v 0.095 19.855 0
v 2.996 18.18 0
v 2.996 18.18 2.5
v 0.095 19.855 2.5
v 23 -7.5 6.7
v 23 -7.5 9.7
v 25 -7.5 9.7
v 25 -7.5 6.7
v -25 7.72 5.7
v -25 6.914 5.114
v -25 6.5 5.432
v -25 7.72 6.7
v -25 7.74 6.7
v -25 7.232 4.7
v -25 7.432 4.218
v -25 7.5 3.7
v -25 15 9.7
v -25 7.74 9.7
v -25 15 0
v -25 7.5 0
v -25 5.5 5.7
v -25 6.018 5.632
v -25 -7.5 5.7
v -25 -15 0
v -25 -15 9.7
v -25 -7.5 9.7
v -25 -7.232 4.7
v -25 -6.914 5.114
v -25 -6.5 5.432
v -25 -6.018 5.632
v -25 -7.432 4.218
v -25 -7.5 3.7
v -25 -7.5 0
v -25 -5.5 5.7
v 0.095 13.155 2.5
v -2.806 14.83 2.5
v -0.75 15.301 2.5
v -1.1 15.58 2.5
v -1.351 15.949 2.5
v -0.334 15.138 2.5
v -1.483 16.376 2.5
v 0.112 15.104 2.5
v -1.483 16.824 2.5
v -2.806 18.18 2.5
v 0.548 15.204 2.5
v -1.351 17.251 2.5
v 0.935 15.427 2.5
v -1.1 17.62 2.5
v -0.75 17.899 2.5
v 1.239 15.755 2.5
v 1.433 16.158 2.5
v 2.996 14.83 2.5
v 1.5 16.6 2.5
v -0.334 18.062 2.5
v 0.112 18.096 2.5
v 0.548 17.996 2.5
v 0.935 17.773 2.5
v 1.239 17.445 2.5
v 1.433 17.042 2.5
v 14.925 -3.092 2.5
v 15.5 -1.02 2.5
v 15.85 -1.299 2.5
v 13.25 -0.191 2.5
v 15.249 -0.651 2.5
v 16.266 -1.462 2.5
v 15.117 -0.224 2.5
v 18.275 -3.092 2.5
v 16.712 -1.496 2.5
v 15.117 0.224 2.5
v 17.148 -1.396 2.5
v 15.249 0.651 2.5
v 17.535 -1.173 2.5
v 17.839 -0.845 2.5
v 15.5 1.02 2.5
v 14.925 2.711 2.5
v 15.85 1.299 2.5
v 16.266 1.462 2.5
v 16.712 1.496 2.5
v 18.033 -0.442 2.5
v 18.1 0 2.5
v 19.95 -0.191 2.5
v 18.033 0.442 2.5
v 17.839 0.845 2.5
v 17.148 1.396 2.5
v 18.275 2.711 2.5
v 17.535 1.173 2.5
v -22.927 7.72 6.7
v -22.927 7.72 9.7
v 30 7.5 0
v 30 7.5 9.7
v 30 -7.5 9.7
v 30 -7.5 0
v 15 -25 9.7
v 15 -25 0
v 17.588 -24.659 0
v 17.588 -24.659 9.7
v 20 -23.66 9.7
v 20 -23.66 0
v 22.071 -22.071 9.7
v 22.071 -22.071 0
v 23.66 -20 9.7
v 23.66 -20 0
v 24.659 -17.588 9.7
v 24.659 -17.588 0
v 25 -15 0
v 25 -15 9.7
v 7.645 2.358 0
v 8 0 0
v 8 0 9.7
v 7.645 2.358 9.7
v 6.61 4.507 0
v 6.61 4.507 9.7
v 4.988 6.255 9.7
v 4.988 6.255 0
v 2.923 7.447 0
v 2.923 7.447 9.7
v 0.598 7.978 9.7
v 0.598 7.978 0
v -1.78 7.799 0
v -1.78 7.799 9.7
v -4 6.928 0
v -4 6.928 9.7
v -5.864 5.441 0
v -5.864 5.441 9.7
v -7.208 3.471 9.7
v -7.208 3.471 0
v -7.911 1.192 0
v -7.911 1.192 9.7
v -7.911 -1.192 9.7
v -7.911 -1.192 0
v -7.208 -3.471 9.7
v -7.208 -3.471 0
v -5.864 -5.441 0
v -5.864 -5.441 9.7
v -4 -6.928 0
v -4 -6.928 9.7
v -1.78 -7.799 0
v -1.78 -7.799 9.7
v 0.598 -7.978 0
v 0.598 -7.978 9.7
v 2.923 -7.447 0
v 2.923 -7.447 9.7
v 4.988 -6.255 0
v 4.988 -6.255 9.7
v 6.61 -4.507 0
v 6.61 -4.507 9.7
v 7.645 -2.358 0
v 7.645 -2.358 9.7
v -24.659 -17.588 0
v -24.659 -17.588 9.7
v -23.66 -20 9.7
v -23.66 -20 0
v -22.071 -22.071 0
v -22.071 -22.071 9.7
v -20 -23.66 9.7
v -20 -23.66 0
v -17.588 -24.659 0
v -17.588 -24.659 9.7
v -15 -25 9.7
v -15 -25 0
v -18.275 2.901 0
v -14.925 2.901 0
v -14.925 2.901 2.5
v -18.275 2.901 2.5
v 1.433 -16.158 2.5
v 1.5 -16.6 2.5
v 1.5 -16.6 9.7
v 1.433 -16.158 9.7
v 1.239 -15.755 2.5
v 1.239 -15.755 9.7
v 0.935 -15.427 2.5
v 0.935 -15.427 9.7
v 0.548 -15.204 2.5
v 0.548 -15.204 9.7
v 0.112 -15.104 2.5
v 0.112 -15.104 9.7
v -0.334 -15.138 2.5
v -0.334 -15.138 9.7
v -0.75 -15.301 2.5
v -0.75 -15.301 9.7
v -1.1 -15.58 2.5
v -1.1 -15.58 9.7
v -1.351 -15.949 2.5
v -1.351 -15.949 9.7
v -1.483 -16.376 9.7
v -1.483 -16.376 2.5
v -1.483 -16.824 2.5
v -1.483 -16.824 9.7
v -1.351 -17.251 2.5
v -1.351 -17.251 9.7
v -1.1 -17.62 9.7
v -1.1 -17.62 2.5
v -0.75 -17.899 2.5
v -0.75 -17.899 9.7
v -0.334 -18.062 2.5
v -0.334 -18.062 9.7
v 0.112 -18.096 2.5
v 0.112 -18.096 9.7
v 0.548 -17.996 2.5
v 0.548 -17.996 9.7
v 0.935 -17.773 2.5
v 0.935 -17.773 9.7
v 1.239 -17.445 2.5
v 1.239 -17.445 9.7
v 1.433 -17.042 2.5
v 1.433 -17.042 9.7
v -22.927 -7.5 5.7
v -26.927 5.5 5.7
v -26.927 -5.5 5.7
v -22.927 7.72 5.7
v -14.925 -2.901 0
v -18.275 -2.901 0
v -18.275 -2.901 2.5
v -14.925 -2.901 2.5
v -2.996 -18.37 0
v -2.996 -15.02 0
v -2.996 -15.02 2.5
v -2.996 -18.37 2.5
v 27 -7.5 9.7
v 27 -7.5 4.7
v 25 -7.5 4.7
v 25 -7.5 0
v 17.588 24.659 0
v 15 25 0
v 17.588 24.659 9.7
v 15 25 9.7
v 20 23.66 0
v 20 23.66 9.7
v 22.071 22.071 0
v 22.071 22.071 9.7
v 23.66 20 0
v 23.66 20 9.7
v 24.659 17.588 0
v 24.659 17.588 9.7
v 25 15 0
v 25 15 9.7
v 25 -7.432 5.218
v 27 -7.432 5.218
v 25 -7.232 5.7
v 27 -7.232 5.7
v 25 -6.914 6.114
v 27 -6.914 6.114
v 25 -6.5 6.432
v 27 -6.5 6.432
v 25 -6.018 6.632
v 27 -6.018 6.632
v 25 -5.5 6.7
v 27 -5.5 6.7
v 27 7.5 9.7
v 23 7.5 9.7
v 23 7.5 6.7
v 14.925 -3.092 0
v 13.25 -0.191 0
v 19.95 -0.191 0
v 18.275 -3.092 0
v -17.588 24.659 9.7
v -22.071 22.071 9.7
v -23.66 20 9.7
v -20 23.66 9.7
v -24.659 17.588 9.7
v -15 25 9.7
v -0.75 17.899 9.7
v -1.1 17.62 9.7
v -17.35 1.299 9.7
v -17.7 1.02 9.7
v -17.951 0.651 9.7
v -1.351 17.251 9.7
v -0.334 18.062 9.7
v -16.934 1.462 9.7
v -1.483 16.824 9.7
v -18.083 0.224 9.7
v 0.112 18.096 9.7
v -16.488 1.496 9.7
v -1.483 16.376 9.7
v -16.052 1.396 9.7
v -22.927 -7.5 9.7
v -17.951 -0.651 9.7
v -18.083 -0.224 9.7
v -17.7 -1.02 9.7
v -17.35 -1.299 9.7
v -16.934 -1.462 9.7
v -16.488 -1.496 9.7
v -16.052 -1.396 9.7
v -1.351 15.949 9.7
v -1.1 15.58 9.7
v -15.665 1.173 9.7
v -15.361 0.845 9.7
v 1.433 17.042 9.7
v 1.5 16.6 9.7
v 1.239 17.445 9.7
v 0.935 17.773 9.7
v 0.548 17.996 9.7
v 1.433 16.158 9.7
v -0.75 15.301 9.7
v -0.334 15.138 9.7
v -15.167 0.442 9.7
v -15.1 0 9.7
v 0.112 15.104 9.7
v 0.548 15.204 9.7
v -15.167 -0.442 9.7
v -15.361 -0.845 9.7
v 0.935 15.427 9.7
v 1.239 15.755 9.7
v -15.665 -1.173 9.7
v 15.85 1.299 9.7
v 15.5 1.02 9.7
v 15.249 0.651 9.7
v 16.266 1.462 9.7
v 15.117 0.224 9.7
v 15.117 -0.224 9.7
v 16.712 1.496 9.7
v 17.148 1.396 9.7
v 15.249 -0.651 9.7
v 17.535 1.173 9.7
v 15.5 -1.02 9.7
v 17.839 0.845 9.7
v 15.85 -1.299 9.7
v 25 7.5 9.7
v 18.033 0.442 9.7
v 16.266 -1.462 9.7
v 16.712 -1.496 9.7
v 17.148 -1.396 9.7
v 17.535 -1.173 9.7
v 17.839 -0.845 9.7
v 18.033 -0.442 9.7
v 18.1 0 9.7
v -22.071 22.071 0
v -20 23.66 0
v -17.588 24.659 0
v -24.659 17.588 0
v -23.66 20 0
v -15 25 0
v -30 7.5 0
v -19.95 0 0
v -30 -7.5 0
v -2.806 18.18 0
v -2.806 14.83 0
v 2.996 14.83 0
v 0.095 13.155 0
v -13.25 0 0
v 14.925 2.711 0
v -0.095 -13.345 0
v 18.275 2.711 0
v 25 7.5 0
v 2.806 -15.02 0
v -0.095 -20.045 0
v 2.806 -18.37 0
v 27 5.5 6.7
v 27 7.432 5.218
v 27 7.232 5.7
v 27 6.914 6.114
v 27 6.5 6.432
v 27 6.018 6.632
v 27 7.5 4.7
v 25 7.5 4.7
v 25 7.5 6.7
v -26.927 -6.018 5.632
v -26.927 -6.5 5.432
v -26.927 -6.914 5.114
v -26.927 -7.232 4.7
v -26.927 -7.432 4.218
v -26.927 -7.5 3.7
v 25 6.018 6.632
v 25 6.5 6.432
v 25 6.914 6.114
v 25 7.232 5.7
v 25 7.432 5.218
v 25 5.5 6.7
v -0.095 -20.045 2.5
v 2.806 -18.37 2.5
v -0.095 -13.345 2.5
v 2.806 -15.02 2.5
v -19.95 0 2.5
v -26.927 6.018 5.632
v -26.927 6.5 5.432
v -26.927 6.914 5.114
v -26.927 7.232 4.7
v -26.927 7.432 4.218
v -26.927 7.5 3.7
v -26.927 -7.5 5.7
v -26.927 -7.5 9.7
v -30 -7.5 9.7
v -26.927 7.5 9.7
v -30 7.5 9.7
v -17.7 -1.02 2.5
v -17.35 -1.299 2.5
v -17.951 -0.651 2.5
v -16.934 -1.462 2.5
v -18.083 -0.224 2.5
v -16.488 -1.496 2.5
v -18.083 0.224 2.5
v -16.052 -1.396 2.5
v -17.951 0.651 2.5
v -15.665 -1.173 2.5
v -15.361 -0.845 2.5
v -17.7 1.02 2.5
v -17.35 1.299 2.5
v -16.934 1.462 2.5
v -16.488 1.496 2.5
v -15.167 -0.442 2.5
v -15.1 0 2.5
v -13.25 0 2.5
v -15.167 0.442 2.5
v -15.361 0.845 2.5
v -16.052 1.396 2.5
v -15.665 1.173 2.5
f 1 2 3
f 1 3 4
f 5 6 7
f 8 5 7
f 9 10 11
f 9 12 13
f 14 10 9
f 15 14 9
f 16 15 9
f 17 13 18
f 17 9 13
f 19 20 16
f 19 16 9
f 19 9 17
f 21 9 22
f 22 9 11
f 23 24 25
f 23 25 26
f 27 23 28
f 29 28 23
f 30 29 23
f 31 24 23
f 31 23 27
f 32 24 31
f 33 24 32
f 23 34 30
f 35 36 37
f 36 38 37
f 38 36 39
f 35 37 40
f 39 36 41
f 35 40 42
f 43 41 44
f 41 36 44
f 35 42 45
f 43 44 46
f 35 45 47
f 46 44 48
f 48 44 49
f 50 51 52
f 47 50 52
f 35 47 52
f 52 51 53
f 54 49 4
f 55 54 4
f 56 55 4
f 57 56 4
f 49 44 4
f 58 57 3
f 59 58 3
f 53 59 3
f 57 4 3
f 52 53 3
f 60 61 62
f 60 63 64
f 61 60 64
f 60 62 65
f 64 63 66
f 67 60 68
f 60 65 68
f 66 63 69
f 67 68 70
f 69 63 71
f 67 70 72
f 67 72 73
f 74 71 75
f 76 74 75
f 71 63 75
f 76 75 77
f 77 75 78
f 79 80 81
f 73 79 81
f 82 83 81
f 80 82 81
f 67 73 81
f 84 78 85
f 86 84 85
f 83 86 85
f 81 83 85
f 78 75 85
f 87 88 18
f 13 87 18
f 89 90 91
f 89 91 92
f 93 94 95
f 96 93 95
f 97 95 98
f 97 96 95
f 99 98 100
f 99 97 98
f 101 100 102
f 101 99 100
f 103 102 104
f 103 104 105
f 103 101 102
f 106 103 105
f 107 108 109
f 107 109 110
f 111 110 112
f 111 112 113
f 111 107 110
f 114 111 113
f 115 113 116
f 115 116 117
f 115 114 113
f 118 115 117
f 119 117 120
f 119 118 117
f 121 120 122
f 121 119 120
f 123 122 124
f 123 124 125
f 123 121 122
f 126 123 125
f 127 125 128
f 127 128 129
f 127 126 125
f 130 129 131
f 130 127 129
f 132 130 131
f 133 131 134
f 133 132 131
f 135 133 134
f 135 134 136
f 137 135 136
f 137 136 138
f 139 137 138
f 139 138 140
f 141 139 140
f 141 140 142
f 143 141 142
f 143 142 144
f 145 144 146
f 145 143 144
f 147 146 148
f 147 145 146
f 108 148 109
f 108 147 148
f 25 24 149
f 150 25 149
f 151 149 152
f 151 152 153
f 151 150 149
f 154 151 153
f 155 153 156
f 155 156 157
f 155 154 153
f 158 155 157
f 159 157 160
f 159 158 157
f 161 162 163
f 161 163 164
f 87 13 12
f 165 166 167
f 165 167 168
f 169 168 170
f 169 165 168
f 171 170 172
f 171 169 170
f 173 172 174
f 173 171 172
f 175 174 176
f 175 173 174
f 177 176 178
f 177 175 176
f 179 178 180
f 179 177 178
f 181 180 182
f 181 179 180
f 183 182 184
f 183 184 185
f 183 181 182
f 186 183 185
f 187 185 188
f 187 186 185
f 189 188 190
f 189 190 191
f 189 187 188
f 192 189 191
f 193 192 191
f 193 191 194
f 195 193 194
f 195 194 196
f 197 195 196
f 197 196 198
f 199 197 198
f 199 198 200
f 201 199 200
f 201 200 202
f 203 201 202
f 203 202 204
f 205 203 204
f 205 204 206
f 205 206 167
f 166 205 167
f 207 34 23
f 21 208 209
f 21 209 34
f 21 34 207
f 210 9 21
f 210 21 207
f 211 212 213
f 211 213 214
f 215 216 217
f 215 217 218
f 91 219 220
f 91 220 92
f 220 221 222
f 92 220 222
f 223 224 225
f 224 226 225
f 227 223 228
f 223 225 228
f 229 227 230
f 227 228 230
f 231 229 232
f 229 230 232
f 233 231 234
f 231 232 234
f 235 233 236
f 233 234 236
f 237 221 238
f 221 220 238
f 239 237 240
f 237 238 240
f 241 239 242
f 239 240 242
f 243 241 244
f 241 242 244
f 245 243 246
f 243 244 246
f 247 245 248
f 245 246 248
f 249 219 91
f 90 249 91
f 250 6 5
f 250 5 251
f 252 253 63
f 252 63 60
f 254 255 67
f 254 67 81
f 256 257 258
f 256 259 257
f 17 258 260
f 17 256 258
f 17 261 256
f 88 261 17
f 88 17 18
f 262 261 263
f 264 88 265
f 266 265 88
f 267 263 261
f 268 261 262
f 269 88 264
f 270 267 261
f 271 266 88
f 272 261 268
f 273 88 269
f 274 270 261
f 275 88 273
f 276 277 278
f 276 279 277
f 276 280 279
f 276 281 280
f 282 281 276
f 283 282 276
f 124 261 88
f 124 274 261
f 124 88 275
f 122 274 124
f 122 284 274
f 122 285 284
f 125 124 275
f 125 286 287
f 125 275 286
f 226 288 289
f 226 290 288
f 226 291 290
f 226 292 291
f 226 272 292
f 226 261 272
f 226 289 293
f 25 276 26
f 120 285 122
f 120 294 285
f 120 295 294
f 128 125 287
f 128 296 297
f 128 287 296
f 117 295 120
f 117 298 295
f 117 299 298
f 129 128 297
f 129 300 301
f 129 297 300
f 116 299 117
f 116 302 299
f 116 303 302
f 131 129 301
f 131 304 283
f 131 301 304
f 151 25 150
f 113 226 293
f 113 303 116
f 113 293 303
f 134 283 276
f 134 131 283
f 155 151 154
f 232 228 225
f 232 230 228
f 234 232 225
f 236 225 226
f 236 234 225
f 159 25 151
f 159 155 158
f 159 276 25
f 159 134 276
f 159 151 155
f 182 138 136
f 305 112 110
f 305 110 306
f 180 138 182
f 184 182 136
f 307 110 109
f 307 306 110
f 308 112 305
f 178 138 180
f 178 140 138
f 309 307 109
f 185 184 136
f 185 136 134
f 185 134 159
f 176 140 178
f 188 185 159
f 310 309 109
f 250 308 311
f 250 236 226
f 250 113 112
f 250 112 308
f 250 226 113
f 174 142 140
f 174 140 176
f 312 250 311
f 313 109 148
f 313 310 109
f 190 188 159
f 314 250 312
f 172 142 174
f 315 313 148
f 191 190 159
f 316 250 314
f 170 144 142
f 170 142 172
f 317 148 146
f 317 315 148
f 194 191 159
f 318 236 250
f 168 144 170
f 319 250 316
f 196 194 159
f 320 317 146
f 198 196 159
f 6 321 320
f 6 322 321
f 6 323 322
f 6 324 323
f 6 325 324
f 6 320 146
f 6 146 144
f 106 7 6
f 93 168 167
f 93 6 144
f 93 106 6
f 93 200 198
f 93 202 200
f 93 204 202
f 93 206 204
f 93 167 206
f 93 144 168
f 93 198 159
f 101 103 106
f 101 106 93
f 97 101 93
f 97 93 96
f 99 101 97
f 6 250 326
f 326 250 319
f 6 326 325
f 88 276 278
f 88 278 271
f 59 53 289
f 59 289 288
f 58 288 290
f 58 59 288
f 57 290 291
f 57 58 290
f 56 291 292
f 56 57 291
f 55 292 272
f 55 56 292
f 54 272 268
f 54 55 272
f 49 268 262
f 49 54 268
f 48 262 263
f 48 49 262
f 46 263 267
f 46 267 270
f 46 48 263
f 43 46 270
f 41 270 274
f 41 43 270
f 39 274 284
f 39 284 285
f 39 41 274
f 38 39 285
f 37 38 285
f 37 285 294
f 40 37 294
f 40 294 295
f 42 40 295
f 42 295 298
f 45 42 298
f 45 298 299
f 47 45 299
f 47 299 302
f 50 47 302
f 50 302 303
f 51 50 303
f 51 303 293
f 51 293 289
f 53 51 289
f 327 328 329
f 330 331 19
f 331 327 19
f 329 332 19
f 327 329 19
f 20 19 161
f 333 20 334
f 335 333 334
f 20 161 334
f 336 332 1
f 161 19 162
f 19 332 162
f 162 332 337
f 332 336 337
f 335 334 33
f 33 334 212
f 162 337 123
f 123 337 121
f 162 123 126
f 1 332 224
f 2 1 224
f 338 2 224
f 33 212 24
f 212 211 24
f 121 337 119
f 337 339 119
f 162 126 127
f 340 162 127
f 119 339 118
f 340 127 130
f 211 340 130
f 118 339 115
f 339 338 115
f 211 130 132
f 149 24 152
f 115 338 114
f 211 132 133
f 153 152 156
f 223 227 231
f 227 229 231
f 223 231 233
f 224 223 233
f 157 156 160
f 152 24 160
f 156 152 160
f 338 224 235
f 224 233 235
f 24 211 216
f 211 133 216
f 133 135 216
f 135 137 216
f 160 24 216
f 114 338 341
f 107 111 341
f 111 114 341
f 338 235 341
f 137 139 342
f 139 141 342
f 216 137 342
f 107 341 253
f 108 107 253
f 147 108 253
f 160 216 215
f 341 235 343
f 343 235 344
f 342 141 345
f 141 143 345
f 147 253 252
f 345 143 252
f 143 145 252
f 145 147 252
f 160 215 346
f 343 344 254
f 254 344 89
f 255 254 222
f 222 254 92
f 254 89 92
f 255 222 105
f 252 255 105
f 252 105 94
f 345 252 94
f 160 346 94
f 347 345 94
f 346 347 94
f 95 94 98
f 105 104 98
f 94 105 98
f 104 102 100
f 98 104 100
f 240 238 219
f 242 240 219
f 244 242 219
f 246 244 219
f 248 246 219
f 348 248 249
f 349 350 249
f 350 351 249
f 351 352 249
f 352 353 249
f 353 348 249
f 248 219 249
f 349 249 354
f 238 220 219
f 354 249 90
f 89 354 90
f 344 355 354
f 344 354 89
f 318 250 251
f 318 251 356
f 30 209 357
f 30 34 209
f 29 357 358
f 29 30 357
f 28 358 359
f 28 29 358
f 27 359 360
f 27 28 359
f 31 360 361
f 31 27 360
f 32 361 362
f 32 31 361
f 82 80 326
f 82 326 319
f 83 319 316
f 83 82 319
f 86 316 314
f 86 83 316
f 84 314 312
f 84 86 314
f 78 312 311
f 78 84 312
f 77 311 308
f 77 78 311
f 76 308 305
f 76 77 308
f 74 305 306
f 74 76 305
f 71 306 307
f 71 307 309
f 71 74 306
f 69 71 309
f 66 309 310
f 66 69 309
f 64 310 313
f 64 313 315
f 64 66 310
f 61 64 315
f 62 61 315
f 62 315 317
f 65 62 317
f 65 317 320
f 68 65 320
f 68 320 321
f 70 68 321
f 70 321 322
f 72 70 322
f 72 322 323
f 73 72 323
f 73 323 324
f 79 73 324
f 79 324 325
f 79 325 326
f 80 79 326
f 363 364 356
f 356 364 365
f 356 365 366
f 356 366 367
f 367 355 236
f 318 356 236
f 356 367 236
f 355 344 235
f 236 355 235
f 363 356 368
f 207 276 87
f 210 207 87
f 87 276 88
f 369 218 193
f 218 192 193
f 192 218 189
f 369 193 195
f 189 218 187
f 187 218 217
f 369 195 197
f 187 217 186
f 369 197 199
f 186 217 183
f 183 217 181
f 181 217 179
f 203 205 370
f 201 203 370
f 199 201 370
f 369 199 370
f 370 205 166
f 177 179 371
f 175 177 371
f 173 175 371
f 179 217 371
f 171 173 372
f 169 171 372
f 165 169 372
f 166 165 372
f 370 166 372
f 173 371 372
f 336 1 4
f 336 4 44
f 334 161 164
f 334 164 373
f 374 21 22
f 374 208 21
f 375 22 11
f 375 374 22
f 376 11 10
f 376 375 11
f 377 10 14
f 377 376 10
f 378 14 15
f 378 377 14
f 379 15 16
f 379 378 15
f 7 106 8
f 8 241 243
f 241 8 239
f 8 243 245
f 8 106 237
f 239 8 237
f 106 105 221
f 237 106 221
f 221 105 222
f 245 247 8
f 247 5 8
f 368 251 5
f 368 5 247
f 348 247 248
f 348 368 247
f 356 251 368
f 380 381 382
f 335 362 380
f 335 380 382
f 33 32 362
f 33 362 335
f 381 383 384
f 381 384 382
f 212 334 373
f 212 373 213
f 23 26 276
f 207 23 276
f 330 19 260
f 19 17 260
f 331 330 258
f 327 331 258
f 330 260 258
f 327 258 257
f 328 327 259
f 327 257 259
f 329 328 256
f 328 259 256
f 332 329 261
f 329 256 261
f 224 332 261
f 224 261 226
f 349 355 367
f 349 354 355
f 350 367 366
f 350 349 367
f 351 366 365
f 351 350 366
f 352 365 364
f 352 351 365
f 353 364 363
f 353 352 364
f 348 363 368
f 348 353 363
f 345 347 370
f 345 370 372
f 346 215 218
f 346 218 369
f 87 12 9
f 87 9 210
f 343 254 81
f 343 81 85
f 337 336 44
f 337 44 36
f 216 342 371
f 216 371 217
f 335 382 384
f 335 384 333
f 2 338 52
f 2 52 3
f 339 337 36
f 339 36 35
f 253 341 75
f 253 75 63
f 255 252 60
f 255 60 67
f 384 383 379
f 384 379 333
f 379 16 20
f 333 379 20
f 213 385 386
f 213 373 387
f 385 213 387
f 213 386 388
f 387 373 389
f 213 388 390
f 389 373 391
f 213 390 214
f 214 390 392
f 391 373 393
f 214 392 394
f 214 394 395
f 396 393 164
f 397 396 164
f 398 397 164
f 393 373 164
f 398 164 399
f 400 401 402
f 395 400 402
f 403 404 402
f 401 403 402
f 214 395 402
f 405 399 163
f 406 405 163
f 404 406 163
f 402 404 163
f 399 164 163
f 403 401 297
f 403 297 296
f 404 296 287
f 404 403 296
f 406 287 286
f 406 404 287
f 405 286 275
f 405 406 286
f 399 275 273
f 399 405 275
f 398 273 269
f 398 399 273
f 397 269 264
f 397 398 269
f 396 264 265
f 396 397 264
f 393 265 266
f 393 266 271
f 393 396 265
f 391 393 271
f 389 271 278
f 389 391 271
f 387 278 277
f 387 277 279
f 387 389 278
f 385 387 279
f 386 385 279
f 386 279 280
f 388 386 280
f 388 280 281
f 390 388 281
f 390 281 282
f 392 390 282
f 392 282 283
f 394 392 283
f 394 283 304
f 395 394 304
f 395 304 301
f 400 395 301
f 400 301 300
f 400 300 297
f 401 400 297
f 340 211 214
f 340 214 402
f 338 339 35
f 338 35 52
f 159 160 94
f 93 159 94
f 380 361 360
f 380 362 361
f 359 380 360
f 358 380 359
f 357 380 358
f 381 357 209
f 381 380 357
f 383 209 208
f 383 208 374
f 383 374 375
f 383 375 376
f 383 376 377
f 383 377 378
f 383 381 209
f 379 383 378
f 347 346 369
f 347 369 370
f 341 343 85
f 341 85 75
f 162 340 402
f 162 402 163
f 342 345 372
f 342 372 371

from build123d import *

# Parameters (mm, degrees)
SKETCH1_W           = 50
SKETCH1_H           = 50
SKETCH1_R           = 8
SKETCH1_R_2         = 1.5
BOSS_EXTRUDE1_DEPTH = 9.7
FILLET2_R           = 10
CUT_EXTRUDE1_DEPTH  = 2.5
SKETCH7_W           = 9.7
SKETCH7_H           = 15
BOSS_EXTRUDE2_DEPTH = 5
SKETCH10_W          = 4
SKETCH10_H          = 15
CUT_EXTRUDE2_DEPTH  = 3
FILLET3_R           = 2
CIRPATTERN9_COUNT   = 2
SKETCH11_W          = 4
SKETCH11_H          = 15.220357073
CUT_EXTRUDE3_DEPTH  = 4
FILLET5_R           = 2


with BuildPart() as part:
    # Sketch1 → Boss-Extrude1 (new body)
    with BuildSketch(Plane.XY):
        Rectangle(SKETCH1_W, SKETCH1_H)
        Circle(SKETCH1_R, mode=Mode.SUBTRACT)
        with Locations((16.6, 0)):
            Circle(SKETCH1_R_2, mode=Mode.SUBTRACT)
        with Locations((0, -16.6)):
            Circle(SKETCH1_R_2, mode=Mode.SUBTRACT)
        with Locations((-16.6, 0)):
            Circle(SKETCH1_R_2, mode=Mode.SUBTRACT)
        with Locations((0, 16.6)):
            Circle(SKETCH1_R_2, mode=Mode.SUBTRACT)
    extrude(amount=BOSS_EXTRUDE1_DEPTH)

    # Fillet2
    fillet2_edges = [part.edges().sort_by_distance(p)[0] for p in [
        (-25, -25, 4.85),
        (-25, 25, 4.85),
        (25, 25, 4.85),
        (25, -25, 4.85),
    ]]
    fillet(fillet2_edges, radius=FILLET2_R)

    # Sketch9 → Cut-Extrude1 (cut)
    with BuildSketch(Plane(origin=(0, 0, 0), x_dir=(-1, 0, 0), z_dir=(0, 0, -1))):
        Polygon((2.996447897, -15.020262794), (2.996447897, -18.370262794), (0.095262794, -20.045262794), (-2.805922308, -18.370262794), (-2.805922308, -15.020262794), (0.095262794, -13.345262794), align=None)
        Polygon((18.275, -2.901185103), (14.925, -2.901185103), (13.25, 0), (14.925, 2.901185103), (18.275, 2.901185103), (19.95, 0), align=None)
        Polygon((2.805922308, 14.829737206), (-0.095262794, 13.154737206), (-2.996447897, 14.829737206), (-2.996447897, 18.179737206), (-0.095262794, 19.854737206), (2.805922308, 18.179737206), align=None)
        Polygon((-13.25, -0.190525589), (-14.925, -3.091710692), (-18.275, -3.091710692), (-19.95, -0.190525589), (-18.275, 2.710659514), (-14.925, 2.710659514), align=None)
    extrude(amount=-CUT_EXTRUDE1_DEPTH, mode=Mode.SUBTRACT)

    # Sketch7 → Boss-Extrude2 (add)
    with BuildSketch(Plane(origin=(25, 0, 0), x_dir=(0, 0, -1), z_dir=(1, 0, 0))):
        with Locations((-4.85, 0)):
            Rectangle(SKETCH7_W, SKETCH7_H)
    boss_extrude2 = extrude(amount=BOSS_EXTRUDE2_DEPTH)

    # Sketch10 → Cut-Extrude2 (cut)
    with BuildSketch(Plane.XY.offset(9.7)):
        with Locations((25, 0)):
            Rectangle(SKETCH10_W, SKETCH10_H)
        Polygon((-26.926788745, 7.758740095), (-27.070725077, -7.2405693), (-23.070909239, -7.278952322), (-22.926972907, 7.720357073), align=None)
    extrude(amount=-CUT_EXTRUDE2_DEPTH, mode=Mode.SUBTRACT)

    # Fillet3
    fillet3_edges = [part.edges().sort_by_distance(p)[0] for p in [
        (26, -7.5, 6.7),
        (26, 7.5, 6.7),
    ]]
    fillet(fillet3_edges, radius=FILLET3_R)

    # CirPattern9: Boss-Extrude2 ×2 about axis
    cirpattern9_axis = Axis((0, 0, 0), (0, 0, 1))
    for i in range(1, CIRPATTERN9_COUNT):
        add(boss_extrude2.rotate(cirpattern9_axis, i * 360 / CIRPATTERN9_COUNT))

    # Sketch11 → Cut-Extrude3 (cut)
    with BuildSketch(Plane.XY.offset(9.7)):
        with Locations((-24.926972907, 0.110178536)):
            Rectangle(SKETCH11_W, SKETCH11_H)
    extrude(amount=-CUT_EXTRUDE3_DEPTH, mode=Mode.SUBTRACT)

    # Fillet5
    fillet5_edges = [part.edges().sort_by_distance(p)[0] for p in [
        (-25.963486453, -7.5, 5.7),
        (-25.963486453, 7.5, 5.7),
    ]]
    fillet(fillet5_edges, radius=FILLET5_R)


solid = part.part
